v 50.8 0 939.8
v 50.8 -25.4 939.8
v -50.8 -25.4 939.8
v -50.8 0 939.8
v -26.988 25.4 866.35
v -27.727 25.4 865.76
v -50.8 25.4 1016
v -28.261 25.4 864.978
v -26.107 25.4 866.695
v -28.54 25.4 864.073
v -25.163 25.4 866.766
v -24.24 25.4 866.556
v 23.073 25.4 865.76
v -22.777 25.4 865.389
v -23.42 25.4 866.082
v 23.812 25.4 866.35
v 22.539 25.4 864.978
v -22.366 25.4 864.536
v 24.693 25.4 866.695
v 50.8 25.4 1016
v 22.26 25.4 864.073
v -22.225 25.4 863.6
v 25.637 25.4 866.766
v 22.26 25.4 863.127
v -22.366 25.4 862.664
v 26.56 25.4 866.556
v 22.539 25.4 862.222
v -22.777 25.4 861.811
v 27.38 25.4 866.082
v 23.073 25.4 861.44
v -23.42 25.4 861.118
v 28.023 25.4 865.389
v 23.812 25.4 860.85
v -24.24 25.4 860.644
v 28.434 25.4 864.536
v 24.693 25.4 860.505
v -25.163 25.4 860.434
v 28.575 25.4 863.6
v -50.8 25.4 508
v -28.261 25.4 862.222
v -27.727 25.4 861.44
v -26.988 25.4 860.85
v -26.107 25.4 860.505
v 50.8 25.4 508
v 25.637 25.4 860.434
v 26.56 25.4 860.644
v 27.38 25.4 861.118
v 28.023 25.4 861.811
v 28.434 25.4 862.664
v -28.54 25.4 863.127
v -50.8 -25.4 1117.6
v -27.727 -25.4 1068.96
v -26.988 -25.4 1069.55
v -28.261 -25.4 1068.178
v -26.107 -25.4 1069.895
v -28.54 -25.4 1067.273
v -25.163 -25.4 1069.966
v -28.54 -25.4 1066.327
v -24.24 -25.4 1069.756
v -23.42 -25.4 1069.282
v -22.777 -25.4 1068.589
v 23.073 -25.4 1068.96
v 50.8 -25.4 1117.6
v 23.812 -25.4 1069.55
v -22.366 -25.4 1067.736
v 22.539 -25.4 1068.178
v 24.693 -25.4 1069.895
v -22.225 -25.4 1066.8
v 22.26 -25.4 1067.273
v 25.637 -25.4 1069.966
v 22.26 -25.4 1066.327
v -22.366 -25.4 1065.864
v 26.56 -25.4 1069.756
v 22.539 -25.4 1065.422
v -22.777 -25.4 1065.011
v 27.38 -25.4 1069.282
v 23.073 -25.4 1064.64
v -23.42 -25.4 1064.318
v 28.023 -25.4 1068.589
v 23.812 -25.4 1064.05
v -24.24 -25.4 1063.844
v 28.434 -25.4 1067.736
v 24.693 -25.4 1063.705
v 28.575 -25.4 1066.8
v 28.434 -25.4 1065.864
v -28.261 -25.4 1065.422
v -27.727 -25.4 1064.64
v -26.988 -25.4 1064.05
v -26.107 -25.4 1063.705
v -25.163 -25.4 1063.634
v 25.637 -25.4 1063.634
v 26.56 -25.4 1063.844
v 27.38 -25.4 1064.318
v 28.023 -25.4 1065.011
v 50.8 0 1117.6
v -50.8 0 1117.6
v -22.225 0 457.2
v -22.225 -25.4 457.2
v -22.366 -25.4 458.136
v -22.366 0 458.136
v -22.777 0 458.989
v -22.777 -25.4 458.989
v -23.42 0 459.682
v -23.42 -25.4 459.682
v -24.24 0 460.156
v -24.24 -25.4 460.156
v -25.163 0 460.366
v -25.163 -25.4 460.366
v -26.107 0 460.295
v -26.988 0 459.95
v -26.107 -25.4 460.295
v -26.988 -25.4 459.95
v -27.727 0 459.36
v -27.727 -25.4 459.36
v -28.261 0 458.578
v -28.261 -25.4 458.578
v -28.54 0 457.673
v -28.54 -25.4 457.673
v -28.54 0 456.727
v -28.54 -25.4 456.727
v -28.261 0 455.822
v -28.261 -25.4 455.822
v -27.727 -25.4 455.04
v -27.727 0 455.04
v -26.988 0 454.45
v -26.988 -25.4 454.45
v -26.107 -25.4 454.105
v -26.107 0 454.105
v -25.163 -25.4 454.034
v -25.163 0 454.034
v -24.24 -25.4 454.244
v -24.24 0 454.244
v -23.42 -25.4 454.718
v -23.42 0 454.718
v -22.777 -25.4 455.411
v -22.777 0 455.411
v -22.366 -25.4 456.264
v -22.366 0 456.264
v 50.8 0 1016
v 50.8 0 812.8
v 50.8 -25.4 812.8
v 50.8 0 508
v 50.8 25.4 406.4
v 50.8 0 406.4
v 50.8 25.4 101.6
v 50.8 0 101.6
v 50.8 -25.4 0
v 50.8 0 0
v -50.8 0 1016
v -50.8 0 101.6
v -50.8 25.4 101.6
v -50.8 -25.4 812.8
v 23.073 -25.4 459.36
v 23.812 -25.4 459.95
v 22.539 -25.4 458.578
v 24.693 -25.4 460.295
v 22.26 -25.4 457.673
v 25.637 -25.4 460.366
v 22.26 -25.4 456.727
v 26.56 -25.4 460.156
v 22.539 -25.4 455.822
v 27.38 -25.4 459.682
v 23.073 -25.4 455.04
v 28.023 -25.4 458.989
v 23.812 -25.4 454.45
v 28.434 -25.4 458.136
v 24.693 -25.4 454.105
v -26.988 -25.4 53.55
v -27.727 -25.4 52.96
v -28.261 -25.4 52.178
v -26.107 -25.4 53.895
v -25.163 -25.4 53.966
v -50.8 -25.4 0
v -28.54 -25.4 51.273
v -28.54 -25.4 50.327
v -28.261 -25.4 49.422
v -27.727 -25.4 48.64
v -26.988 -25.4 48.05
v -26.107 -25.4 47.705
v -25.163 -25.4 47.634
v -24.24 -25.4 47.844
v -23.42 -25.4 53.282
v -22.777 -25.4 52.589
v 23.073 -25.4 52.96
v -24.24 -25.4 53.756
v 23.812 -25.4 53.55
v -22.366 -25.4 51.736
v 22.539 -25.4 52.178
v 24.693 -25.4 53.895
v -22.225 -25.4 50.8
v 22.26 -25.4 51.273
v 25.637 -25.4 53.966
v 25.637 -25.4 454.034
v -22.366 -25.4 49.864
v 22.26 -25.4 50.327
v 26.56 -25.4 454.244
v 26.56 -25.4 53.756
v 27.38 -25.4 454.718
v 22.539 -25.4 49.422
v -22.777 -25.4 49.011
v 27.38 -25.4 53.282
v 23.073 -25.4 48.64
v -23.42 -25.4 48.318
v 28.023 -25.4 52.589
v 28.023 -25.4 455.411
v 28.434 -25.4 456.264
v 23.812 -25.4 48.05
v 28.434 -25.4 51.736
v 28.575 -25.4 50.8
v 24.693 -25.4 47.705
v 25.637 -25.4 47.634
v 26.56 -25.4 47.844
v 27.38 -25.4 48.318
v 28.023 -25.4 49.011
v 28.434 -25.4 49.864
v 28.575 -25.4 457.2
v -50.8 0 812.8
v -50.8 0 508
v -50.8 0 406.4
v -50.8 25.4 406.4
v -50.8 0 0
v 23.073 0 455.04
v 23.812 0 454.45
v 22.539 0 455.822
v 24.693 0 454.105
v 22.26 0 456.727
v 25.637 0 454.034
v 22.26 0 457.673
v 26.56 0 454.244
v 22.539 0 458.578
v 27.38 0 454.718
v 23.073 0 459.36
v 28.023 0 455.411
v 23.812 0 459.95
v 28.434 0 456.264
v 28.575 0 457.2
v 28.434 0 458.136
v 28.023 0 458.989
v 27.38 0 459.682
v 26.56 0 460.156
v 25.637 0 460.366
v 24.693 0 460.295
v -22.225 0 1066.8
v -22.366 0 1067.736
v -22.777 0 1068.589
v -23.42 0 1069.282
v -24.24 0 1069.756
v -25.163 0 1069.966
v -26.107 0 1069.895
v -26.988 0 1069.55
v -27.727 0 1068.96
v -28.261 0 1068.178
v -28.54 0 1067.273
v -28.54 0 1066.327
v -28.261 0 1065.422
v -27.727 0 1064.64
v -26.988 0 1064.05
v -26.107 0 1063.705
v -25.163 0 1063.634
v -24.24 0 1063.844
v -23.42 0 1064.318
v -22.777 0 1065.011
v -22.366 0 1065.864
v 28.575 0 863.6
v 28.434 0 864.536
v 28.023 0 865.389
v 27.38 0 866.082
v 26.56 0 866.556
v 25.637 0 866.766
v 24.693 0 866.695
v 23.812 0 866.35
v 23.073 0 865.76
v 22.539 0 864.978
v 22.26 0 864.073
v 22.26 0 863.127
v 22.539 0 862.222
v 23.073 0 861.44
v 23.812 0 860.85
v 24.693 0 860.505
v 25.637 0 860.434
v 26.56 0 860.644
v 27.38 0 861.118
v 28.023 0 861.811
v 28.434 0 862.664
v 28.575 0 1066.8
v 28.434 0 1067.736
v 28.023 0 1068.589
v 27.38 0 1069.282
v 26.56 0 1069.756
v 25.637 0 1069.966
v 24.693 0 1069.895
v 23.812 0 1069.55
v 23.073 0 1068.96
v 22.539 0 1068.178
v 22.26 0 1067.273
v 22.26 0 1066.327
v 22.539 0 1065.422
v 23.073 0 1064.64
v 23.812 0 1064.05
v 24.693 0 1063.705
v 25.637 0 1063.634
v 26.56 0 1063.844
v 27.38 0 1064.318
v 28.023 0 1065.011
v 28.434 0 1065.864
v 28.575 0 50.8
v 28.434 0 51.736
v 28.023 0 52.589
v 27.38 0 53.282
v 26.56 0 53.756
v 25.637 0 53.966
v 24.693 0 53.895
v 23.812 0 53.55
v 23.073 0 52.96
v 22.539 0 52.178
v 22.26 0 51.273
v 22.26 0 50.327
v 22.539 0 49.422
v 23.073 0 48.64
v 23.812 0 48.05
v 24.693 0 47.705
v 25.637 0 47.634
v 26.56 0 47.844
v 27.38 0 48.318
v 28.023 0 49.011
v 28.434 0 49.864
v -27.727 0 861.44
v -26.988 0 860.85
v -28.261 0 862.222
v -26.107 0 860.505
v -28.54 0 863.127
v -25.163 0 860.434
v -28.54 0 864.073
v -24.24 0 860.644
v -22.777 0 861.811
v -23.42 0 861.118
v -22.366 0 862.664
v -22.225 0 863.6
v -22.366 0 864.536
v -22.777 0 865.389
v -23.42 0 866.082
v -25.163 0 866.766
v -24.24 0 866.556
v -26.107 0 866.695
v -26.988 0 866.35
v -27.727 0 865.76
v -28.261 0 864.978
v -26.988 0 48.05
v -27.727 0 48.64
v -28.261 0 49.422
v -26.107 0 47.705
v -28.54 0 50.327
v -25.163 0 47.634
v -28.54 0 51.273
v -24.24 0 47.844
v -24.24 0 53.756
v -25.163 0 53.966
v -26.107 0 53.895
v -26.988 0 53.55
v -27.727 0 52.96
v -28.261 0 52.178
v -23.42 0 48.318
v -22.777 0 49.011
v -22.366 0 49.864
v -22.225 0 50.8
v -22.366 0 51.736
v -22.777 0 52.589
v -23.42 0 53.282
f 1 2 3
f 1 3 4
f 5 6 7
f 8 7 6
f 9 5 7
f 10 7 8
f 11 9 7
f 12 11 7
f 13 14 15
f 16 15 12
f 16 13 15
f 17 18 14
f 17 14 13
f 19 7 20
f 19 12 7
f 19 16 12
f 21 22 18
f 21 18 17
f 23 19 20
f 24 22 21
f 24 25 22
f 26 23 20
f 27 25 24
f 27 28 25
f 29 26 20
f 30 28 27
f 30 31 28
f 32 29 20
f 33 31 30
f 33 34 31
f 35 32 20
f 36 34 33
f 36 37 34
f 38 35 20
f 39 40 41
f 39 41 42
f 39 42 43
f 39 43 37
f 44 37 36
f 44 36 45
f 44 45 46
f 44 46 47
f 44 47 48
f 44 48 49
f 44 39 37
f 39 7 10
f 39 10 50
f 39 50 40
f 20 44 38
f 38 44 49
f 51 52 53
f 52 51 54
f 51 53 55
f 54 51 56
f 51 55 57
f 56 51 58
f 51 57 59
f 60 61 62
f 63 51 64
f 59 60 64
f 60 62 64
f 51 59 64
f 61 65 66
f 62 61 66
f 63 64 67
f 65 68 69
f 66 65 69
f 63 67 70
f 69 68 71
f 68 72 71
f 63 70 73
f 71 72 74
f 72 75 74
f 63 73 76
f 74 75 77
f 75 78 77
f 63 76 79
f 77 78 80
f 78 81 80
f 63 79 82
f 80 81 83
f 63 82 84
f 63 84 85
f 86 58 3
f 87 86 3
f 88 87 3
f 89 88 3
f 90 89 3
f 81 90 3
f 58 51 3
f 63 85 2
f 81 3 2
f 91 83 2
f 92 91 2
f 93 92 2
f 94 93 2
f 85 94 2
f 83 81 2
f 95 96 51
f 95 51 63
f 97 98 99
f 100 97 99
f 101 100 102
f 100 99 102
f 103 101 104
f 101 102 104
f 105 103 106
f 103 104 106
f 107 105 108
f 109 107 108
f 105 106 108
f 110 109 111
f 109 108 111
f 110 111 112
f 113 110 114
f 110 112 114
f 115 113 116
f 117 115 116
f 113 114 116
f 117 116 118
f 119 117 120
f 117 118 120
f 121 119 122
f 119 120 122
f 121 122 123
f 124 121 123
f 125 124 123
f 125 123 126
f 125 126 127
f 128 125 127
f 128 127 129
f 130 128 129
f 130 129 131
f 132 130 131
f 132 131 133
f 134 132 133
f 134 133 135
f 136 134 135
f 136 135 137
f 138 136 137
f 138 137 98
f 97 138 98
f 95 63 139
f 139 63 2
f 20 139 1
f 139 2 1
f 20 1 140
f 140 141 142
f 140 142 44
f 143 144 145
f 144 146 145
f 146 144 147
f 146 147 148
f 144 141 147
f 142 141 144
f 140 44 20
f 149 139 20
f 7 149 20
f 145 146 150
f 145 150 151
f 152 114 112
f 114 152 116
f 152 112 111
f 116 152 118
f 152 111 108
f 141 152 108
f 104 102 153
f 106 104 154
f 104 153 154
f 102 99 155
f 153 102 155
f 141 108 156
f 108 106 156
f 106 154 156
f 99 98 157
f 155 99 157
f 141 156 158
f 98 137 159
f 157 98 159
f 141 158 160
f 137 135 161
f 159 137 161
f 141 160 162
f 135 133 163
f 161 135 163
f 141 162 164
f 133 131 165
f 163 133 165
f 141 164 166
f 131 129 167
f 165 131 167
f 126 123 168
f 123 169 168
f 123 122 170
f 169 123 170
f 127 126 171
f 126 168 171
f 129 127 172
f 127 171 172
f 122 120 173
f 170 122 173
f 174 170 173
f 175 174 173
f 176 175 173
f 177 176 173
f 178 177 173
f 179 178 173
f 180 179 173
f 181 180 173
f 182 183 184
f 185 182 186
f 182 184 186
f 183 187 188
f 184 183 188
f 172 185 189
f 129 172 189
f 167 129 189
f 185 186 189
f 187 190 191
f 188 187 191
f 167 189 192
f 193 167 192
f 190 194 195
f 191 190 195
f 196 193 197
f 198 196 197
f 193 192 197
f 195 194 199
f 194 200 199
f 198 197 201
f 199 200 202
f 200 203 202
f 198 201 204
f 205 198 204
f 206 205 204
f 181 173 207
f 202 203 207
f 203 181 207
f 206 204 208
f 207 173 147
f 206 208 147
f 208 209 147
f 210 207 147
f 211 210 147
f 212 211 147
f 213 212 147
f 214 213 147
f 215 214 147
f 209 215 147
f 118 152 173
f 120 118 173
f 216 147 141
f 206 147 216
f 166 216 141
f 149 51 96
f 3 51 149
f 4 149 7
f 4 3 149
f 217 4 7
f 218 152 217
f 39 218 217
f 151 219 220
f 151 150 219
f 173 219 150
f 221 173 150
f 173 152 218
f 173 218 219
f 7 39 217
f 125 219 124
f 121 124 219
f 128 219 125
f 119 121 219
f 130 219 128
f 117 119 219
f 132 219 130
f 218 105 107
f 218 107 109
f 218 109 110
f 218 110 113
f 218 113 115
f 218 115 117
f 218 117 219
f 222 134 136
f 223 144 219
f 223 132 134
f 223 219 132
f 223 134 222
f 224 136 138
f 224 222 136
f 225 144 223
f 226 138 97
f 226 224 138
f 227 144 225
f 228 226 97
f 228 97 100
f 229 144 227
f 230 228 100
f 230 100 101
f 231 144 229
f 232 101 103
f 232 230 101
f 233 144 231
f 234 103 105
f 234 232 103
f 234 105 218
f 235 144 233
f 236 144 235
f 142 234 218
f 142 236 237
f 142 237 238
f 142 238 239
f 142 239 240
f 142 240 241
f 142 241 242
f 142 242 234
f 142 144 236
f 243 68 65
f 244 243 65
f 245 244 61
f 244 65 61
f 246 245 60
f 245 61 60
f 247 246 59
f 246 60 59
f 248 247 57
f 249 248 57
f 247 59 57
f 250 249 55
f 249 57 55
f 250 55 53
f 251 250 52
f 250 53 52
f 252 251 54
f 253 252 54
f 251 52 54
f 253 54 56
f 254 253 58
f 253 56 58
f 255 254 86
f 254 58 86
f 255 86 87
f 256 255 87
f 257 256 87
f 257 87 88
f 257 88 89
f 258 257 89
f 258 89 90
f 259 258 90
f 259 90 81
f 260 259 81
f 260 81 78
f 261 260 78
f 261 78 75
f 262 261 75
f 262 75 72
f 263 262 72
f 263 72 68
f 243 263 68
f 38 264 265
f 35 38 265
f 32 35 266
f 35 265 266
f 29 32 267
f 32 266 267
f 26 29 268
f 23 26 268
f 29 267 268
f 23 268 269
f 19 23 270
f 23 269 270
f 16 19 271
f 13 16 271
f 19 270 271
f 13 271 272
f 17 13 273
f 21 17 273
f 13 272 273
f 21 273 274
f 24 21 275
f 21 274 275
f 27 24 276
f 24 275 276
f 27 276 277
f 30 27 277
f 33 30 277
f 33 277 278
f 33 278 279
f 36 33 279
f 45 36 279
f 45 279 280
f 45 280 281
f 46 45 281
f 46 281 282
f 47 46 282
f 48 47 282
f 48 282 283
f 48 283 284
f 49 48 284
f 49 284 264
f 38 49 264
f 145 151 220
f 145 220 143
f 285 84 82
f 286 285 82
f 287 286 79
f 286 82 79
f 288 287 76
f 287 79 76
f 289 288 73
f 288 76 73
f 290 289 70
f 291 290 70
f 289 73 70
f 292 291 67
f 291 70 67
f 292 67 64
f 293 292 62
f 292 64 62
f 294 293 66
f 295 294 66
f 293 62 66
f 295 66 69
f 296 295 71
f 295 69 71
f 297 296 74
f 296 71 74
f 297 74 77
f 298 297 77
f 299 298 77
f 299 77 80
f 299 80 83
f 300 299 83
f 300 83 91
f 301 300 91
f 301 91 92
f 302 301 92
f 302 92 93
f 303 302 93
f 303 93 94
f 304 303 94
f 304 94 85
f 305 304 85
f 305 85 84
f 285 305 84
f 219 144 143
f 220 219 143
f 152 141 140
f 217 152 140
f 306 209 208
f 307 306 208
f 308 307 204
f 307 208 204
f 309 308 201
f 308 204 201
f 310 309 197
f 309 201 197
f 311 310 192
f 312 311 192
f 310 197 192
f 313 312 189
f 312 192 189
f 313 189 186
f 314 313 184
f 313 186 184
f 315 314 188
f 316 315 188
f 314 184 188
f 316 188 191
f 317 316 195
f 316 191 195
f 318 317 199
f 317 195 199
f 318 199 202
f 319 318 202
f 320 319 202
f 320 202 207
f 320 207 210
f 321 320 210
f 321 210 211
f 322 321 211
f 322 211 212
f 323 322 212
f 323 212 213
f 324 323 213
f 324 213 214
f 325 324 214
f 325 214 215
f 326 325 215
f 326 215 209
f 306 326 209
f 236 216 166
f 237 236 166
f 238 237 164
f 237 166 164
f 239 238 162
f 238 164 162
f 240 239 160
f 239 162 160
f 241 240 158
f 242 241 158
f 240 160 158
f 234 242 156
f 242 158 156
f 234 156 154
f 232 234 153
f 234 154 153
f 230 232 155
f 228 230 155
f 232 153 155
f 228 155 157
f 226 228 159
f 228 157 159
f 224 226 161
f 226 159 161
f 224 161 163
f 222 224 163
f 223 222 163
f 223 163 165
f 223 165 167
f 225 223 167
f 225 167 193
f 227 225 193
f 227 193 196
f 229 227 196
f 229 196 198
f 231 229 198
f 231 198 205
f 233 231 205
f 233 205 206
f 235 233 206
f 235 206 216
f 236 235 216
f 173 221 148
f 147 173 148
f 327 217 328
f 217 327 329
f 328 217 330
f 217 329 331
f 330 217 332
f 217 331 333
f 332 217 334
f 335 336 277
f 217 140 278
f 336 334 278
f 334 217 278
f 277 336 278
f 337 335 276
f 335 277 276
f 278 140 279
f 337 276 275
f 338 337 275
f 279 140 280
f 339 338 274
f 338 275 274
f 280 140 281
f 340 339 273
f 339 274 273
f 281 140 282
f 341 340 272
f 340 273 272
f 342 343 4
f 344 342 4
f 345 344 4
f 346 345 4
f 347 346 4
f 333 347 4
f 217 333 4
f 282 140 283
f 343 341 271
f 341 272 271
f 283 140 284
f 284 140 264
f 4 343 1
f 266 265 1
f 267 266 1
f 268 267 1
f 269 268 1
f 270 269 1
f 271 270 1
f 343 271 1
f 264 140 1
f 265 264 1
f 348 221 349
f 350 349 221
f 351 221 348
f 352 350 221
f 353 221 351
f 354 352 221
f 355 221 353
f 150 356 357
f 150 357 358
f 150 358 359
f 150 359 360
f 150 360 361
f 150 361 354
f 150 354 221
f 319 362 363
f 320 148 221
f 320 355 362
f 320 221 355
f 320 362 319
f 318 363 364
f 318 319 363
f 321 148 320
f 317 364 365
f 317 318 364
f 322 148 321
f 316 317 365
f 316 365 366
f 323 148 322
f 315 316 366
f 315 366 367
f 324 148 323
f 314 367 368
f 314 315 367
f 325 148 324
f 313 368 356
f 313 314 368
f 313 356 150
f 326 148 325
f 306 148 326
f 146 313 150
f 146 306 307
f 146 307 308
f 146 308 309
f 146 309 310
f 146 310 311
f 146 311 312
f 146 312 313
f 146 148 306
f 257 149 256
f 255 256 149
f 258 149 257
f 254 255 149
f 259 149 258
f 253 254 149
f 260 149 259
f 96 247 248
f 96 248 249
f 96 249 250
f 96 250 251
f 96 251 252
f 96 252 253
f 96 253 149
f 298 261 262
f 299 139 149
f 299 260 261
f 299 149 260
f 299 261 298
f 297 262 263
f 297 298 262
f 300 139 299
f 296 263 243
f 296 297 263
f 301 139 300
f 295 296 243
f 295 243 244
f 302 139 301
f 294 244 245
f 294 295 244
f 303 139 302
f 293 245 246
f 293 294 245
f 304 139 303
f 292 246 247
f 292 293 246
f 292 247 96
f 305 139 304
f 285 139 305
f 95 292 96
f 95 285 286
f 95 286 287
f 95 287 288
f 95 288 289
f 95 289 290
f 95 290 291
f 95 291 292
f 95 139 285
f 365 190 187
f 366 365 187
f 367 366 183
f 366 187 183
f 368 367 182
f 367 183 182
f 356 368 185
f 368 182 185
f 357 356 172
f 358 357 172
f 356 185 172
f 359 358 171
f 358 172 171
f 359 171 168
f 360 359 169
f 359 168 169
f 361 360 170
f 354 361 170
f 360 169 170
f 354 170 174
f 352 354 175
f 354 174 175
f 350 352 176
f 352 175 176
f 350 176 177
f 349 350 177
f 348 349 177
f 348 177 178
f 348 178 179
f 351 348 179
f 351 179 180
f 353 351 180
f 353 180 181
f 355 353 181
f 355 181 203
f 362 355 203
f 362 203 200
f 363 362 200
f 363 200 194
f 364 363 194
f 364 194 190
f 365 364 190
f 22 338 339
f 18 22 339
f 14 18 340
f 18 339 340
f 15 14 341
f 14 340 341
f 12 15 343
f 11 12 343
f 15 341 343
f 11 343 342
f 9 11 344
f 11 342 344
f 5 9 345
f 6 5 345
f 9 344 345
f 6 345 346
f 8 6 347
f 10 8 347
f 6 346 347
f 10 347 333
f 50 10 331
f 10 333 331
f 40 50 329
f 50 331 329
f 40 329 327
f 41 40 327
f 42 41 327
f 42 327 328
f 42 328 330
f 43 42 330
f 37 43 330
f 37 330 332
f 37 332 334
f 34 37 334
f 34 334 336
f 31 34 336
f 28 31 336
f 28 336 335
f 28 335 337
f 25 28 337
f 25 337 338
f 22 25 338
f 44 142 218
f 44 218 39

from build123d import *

# Parameters (mm, degrees)
F0_W     = 101.6
F0_H     = 50.8
F1_DEPTH = 1117.6
F2_W     = 25.4
F2_H     = 101.6
F2_H_2   = 127
F3_DEPTH = 101.601
F4_R     = 3.175
F5_DEPTH = 50.801


with BuildPart() as f1:
    # F0 (on Top) → F1 (new body)
    with BuildSketch(Plane.XY):
        Rectangle(F0_W, F0_H)
    extrude(amount=F1_DEPTH)

    # F2 (on face) → F3 (cut, through all)
    with BuildSketch(Plane.YZ.offset(50.8)):
        with Locations((12.7, 457.2)):
            Rectangle(F2_W, F2_H)
        with Locations((12.7, 50.8)):
            Rectangle(F2_W, F2_H)
        with Locations((12.7, 1066.8)):
            Rectangle(F2_W, F2_H)
        with Locations((-12.7, 876.3)):
            Rectangle(F2_W, F2_H_2)
    extrude(amount=-F3_DEPTH, mode=Mode.SUBTRACT)

    # F4 (on face) → F5 (cut, through all)
    with BuildSketch(Plane.XZ.offset(25.4)):
        with Locations((-25.4, 1066.8)):
            Circle(F4_R)
        with Locations((-25.4, 457.2)):
            Circle(F4_R)
        with Locations((-25.4, 50.8)):
            Circle(F4_R)
        with Locations((25.4, 1066.8)):
            Circle(F4_R)
        with Locations((25.4, 457.2)):
            Circle(F4_R)
        with Locations((25.4, 50.8)):
            Circle(F4_R)
        with Locations((-25.4, 863.6)):
            Circle(F4_R)
        with Locations((25.4, 863.6)):
            Circle(F4_R)
    extrude(amount=-F5_DEPTH, mode=Mode.SUBTRACT)


solid = f1.part
